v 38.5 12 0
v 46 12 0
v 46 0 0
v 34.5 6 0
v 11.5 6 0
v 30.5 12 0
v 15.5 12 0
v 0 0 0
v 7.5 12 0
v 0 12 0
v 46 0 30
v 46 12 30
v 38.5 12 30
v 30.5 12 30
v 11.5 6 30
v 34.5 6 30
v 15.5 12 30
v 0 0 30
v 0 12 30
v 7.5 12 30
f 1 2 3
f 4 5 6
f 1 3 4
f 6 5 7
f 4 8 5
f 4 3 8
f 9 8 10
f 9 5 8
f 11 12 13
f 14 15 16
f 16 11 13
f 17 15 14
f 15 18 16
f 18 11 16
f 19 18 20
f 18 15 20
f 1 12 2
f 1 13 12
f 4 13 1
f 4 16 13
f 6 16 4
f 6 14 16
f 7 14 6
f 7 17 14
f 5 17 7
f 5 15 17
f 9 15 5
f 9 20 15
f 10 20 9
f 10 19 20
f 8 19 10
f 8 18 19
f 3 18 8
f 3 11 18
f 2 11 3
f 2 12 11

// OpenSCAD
$fn = 32;

// ----------------------------------------------------------------------
// V guide rail: doublev, 46 mm wide
// ----------------------------------------------------------------------

// --- parameters (mm) ---
rail_w = 46;              // rail width, X
base_t = 12;              // base plate thickness
v_depth = 6;              // V feature depth / height
v_half_w = 8;             // half width of the V at the base face
plate_t = 30;             // rail length, Z (the extrusion height)
groove_off = 11.5;        // offset of each groove from the centreline

centre_x = rail_w / 2;  // rail centreline
groove_a = centre_x - groove_off;  // axis of the first groove
groove_b = centre_x + groove_off;  // axis of the second groove

profile = [[0, 0], [46, 0], [46, 12], [38.5, 12], [34.5, 6], [30.5, 12], [15.5, 12], [11.5, 6], [7.5, 12], [0, 12]];  // primary outline, 10 points, counter clockwise

// --- the one profile operation ---
linear_extrude(height = plate_t) polygon(points = profile);
